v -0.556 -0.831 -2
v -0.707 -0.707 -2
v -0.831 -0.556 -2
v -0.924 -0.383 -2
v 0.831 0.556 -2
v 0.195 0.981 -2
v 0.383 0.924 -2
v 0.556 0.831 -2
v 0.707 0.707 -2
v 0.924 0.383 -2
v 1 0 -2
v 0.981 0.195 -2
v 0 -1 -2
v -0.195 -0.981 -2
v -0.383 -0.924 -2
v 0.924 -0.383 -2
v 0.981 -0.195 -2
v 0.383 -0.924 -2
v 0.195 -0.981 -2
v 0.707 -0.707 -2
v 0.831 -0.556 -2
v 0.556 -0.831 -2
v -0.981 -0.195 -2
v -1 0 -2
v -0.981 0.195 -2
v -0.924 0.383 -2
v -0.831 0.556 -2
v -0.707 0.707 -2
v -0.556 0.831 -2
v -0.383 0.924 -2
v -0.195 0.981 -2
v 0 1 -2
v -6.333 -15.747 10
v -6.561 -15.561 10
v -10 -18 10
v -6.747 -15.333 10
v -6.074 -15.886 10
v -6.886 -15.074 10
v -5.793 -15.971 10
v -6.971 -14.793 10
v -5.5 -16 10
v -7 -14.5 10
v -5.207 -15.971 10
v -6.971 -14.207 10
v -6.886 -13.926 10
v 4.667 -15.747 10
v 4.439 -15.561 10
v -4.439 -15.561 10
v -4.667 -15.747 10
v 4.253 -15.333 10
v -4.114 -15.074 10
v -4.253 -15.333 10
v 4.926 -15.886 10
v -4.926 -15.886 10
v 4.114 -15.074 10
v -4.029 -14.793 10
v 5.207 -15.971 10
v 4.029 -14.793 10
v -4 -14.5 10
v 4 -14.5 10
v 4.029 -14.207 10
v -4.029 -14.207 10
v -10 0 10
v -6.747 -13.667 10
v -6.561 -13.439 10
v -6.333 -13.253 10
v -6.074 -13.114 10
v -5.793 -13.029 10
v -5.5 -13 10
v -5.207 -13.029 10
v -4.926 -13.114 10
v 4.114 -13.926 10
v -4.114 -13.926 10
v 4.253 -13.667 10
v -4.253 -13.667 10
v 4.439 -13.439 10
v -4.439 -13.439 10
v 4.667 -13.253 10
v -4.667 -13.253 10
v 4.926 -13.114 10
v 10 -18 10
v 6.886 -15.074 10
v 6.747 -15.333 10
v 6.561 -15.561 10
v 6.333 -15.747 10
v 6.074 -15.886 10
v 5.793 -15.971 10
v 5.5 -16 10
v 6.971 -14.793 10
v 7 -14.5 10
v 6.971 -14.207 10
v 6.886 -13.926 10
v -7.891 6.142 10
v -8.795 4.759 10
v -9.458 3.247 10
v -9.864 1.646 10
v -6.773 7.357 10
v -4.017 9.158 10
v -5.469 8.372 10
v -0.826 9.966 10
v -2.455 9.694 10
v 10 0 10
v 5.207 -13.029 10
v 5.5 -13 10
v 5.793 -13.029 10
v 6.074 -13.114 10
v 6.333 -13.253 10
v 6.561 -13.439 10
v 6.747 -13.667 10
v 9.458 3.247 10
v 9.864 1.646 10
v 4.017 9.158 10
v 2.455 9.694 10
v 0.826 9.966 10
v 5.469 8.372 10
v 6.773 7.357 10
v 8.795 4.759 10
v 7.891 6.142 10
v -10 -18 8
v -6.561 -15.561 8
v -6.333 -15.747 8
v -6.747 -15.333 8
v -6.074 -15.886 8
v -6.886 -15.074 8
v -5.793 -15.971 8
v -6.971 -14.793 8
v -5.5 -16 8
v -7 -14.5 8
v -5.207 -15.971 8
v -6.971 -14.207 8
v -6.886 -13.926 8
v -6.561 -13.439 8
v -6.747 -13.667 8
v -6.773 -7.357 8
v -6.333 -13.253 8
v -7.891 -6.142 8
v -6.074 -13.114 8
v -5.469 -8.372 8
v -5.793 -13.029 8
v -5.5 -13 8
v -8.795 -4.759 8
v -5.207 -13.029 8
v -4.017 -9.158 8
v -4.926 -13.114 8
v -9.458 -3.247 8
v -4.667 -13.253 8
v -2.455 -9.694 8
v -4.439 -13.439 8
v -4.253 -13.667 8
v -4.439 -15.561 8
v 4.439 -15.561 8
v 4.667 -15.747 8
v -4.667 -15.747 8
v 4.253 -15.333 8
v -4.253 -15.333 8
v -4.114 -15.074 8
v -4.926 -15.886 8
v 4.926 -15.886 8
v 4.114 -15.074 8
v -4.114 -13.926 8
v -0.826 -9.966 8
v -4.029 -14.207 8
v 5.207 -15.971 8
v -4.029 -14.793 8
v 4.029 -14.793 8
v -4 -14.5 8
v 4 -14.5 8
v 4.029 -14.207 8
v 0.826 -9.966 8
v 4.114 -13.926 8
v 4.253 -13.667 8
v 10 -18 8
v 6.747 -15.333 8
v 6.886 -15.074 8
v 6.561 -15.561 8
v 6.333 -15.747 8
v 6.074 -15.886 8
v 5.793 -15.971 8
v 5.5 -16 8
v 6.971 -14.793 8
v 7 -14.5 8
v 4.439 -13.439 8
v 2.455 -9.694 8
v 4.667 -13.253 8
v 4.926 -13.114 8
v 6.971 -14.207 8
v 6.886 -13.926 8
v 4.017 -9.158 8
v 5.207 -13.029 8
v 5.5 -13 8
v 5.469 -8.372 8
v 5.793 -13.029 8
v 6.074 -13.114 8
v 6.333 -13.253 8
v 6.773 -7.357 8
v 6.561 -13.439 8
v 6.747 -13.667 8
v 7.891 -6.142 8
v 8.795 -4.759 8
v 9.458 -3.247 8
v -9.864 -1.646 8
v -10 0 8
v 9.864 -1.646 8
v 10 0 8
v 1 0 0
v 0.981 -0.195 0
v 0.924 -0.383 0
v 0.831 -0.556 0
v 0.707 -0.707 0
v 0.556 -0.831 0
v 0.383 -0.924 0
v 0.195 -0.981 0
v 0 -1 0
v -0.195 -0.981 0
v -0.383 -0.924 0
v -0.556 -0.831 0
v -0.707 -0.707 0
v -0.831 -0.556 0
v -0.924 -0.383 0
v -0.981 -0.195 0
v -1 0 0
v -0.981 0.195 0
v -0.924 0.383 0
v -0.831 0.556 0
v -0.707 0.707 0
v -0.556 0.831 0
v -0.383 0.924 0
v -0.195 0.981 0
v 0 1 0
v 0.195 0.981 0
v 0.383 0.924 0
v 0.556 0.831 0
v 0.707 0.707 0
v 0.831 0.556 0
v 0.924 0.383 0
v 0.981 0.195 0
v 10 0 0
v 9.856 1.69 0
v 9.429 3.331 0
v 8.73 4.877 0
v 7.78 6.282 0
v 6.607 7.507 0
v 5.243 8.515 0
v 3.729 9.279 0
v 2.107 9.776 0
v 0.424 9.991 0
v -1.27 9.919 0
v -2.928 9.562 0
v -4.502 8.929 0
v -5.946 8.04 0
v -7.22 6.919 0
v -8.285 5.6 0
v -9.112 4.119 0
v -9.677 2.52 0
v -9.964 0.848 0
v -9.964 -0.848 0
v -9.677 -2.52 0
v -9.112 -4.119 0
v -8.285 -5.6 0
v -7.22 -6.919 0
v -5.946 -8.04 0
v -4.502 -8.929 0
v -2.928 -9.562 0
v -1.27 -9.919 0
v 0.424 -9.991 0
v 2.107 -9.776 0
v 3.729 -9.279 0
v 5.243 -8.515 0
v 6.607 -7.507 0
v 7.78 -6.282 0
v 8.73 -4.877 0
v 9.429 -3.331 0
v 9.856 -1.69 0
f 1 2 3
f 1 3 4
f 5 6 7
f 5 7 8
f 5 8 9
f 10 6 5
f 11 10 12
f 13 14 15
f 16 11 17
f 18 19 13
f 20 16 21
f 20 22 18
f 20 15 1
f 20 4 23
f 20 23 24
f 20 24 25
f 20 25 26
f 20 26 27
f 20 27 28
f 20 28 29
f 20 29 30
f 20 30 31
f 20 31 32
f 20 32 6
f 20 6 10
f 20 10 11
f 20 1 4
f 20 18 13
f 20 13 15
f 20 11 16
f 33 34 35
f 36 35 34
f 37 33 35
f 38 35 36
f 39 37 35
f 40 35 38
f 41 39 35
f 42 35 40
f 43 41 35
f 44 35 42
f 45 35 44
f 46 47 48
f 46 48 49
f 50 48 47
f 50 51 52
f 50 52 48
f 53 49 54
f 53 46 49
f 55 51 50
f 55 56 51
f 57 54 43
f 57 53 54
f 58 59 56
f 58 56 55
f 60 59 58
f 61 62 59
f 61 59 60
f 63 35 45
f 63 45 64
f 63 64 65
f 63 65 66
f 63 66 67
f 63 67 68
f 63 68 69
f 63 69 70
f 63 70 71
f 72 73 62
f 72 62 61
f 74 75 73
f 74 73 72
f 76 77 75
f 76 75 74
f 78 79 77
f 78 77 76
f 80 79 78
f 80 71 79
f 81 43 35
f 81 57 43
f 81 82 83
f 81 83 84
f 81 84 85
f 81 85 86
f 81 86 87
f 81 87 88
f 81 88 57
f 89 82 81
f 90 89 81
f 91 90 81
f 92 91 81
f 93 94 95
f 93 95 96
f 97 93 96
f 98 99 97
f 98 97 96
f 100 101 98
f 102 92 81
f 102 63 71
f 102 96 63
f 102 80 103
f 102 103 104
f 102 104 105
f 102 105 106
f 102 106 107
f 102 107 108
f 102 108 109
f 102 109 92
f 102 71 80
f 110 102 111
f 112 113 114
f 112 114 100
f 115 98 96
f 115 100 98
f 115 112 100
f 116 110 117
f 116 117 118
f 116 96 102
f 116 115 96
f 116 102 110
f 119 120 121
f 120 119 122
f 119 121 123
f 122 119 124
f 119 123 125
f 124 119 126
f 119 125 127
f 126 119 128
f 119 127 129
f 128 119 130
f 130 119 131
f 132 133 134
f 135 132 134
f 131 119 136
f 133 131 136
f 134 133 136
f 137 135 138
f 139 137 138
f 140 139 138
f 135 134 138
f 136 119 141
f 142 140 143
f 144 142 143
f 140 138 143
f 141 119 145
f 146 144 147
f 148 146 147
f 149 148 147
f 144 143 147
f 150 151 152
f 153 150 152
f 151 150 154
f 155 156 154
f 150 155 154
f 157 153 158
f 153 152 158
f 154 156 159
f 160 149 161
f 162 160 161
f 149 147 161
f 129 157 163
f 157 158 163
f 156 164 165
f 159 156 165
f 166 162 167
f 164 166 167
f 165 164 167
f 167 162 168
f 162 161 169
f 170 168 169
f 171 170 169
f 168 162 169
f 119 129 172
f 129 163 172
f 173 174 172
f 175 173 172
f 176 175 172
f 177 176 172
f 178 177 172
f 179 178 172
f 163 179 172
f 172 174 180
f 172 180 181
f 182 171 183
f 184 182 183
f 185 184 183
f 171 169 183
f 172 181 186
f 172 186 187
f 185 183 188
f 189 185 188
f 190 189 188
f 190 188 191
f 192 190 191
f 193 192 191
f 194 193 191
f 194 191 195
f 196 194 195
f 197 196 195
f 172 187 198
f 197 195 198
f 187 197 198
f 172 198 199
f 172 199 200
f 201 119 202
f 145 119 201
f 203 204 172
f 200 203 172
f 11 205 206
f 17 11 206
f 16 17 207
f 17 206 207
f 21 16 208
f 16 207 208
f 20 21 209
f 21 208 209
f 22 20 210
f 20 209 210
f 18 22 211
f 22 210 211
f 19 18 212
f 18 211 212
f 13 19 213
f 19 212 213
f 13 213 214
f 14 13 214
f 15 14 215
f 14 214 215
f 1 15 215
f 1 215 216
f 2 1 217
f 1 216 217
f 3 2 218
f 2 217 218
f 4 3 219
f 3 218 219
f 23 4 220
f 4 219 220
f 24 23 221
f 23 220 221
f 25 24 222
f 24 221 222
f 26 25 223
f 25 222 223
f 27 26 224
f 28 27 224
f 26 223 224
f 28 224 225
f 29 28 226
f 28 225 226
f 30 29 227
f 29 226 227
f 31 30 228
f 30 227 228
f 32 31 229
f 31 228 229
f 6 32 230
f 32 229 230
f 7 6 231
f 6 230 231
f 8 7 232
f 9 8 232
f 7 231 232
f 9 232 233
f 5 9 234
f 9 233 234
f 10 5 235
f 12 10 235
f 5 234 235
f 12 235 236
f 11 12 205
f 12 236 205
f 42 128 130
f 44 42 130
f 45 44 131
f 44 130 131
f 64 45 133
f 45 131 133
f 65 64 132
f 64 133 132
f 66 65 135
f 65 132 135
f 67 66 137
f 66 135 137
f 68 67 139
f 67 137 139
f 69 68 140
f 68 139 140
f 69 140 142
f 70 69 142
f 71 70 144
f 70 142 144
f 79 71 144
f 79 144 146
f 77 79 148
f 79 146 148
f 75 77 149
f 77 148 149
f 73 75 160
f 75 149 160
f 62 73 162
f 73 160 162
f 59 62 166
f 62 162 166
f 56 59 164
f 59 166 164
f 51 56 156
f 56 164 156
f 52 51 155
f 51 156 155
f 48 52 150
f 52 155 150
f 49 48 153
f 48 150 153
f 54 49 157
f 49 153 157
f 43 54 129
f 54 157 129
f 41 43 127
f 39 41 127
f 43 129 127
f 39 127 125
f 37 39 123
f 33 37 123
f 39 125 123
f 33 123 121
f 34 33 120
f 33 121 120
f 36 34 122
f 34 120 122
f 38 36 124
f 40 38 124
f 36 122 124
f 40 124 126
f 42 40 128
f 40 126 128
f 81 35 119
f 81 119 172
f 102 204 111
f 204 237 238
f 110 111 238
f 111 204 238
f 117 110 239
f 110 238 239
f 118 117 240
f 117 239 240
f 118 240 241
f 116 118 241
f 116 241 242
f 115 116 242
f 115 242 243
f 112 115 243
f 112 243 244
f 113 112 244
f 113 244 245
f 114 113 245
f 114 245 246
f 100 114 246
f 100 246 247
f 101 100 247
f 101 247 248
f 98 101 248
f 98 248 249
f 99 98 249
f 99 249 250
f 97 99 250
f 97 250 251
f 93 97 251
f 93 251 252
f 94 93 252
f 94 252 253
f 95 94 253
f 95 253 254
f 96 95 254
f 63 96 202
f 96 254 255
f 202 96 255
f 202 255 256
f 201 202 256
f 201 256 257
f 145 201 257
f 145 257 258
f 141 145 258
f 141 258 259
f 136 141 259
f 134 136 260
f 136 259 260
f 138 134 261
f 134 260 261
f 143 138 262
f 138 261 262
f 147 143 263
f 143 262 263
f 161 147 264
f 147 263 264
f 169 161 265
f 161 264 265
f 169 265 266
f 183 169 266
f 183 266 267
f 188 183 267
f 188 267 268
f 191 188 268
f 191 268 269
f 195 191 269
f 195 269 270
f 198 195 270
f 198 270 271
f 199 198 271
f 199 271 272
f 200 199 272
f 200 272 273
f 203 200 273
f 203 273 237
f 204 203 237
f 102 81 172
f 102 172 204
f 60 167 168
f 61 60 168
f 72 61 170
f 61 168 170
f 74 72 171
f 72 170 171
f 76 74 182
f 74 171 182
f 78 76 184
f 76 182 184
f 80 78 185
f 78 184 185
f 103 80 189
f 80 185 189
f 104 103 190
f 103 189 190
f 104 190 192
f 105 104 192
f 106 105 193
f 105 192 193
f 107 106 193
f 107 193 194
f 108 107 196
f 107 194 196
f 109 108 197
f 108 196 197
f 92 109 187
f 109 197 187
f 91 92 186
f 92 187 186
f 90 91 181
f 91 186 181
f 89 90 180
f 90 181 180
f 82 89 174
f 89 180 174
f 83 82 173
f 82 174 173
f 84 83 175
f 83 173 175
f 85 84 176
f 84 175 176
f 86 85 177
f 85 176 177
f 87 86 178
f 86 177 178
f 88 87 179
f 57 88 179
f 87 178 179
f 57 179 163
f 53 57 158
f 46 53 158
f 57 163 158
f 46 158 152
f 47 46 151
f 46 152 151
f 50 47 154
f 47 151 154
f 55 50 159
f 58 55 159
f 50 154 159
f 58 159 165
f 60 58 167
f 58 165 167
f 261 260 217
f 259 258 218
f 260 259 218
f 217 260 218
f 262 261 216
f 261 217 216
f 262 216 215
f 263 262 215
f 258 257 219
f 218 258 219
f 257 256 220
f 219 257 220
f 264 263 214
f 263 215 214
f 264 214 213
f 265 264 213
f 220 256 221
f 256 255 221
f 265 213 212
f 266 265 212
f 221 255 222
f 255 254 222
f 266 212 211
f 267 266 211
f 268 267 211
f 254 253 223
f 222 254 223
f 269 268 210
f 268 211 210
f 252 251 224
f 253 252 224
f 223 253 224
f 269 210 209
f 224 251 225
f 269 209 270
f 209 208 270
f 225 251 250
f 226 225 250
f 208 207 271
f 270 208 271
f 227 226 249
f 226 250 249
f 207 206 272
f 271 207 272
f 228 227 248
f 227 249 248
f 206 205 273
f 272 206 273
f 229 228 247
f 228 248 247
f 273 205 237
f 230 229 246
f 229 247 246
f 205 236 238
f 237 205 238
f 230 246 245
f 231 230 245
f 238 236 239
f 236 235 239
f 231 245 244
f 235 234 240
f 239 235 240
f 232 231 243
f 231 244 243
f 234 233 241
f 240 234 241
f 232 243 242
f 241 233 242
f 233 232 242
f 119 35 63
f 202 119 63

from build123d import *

# Parameters (mm, degrees)
SKETCH1_R           = 10
BOSS_EXTRUDE1_DEPTH = 10
SKETCH2_W           = 20
SKETCH2_H           = 18
BOSS_EXTRUDE2_DEPTH = 2
SKETCH3_R           = 1
BOSS_EXTRUDE3_DEPTH = 2
SKETCH5_R           = 1.5
CUT_EXTRUDE1_DEPTH  = 2


with BuildPart() as part:
    # Sketch1 → Boss-Extrude1 (new body)
    with BuildSketch(Plane.XY):
        Circle(SKETCH1_R)
    extrude(amount=BOSS_EXTRUDE1_DEPTH)

    # Sketch2 → Boss-Extrude2 (add)
    with BuildSketch(Plane.XY.offset(10)):
        with Locations((0, -9)):
            Rectangle(SKETCH2_W, SKETCH2_H)
    extrude(amount=-BOSS_EXTRUDE2_DEPTH)

    # Sketch3 → Boss-Extrude3 (add)
    with BuildSketch(Plane(origin=(0, 0, 0), x_dir=(-1, 0, 0), z_dir=(0, 0, -1))):
        with Locations(Location((0, 0, 0), (0, 0, 180))):
            Circle(SKETCH3_R)
    extrude(amount=BOSS_EXTRUDE3_DEPTH)

    # Sketch5 → Cut-Extrude1 (cut)
    with BuildSketch(Plane(origin=(0, 0, 8), x_dir=(-1, 0, 0), z_dir=(0, 0, -1))):
        with Locations((-5.5, -14.5)):
            Circle(SKETCH5_R)
        with Locations((5.5, -14.5)):
            Circle(SKETCH5_R)
    extrude(amount=-CUT_EXTRUDE1_DEPTH, mode=Mode.SUBTRACT)


solid = part.part
